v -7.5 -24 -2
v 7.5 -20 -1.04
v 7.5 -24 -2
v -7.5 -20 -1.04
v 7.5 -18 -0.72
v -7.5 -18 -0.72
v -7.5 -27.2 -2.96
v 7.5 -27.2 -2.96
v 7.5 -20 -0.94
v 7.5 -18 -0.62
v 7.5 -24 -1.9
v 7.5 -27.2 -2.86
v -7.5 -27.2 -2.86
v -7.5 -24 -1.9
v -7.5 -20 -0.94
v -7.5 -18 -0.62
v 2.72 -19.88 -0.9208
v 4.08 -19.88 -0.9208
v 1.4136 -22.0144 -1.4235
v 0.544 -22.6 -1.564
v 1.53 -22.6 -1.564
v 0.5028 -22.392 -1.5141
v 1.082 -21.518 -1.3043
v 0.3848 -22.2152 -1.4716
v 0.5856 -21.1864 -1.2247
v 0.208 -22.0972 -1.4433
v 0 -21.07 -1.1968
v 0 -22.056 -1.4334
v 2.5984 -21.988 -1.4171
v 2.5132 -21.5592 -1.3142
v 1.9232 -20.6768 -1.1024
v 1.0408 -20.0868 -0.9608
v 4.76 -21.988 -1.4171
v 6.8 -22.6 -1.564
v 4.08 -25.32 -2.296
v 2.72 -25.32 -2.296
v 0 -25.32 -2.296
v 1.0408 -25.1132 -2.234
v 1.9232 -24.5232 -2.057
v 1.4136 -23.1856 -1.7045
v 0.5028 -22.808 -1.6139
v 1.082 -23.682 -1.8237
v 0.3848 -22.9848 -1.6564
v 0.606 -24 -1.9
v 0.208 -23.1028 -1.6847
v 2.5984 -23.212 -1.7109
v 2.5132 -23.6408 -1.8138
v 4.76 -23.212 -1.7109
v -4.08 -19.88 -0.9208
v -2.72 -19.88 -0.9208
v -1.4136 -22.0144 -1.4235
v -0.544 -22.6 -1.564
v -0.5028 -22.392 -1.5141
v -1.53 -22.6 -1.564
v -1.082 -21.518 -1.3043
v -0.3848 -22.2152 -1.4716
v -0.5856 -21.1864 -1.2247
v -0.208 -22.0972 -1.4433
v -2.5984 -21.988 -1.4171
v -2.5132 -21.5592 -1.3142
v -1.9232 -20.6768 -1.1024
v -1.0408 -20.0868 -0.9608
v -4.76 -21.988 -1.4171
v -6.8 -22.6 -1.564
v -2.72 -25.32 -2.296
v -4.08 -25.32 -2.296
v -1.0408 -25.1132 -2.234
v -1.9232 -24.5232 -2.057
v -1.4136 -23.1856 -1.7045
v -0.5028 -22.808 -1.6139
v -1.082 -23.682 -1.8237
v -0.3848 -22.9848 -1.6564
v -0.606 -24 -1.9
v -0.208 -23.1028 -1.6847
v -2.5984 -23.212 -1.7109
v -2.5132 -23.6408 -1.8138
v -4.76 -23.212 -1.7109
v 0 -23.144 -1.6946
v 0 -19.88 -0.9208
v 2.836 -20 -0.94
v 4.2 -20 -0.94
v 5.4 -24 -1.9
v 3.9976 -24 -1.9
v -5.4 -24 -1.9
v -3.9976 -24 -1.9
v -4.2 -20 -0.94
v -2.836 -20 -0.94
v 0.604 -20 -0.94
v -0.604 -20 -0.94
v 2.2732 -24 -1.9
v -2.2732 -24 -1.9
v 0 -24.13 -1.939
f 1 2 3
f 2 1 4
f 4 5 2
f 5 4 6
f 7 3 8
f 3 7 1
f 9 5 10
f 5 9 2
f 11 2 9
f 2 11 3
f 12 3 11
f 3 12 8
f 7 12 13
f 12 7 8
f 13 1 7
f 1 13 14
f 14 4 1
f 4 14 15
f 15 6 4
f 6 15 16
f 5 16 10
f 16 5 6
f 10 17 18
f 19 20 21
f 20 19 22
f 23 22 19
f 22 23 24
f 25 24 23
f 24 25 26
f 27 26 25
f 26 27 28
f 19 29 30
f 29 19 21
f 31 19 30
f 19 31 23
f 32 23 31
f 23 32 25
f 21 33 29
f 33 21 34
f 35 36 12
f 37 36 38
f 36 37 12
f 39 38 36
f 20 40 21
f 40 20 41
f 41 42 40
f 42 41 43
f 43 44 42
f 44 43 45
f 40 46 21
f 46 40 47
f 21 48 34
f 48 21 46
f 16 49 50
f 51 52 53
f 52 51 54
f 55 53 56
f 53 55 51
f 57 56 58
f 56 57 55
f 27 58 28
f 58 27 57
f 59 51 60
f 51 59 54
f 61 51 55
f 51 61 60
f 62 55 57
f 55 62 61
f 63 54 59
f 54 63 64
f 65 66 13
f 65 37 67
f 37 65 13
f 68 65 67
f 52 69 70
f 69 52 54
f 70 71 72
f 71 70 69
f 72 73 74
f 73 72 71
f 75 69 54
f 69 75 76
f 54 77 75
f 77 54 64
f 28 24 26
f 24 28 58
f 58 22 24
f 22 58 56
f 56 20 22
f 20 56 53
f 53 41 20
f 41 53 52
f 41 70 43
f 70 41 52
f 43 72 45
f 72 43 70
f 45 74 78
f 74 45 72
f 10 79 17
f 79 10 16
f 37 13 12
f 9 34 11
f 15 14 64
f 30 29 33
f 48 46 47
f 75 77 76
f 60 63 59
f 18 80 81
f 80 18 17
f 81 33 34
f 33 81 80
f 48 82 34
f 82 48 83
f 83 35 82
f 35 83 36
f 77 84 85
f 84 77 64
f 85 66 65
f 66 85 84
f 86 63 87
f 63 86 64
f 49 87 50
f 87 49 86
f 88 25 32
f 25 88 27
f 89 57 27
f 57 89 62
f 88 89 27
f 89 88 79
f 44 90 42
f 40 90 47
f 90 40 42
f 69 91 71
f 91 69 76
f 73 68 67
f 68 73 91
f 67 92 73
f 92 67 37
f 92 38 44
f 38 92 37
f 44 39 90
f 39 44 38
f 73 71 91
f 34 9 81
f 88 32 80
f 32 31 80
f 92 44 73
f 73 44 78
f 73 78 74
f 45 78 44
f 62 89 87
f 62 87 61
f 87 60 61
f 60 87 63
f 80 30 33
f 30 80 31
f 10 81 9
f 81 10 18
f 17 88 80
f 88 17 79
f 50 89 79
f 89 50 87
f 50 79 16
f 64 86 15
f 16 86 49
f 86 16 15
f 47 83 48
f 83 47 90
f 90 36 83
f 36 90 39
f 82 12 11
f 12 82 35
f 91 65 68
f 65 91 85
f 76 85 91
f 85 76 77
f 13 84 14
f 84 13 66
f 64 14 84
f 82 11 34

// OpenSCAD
use <../lib.scad>
function ldraw_lib__4198678dc01() = [
// 0 Sticker  1.2 x  1.9 with Silver Train Logo (Formed)
// 0 Name: 4198678dc01.dat
// 0 Author: Tim Lampmann [L4mpi]
// 0 !LDRAW_ORG Part UPDATE 2019-03
// 0 !LICENSE Licensed under CC BY 2.0 and CC BY 4.0 : see CAreadme.txt
// 
// 0 !HELP Origin = Origin Part 45677
// 
// 0 BFC CERTIFY CCW
  [0,"BFC","CERTIFY"],
  [0,"BFC","CCW"],
// 
// 0 !KEYWORDS Cargo, container, Crane, Freight yard, Lorry, Set 4514
// 
// 0 !HISTORY 2019-12-27 [PTadmin] Official Update 2019-03
// 
// 
// 4 16 -18.75 2.6 -50 18.75 2.6 -50 18.75 5 -60 -18.75 5 -60
  [4,16,-18.75,2.6,-50,18.75,2.6,-50,18.75,5,-60,-18.75,5,-60],
// 4 16 -18.75 1.8 -45 18.75 1.8 -45 18.75 2.6 -50 -18.75 2.6 -50
  [4,16,-18.75,1.8,-45,18.75,1.8,-45,18.75,2.6,-50,-18.75,2.6,-50],
// 4 16 -18.75 5 -60 18.75 5 -60 18.75 7.4 -68 -18.75 7.4 -68
  [4,16,-18.75,5,-60,18.75,5,-60,18.75,7.4,-68,-18.75,7.4,-68],
// 
// 4 16 18.75 1.8 -45 18.75 1.55 -45 18.75 2.35 -50 18.75 2.6 -50
  [4,16,18.75,1.8,-45,18.75,1.55,-45,18.75,2.35,-50,18.75,2.6,-50],
// 4 16 18.75 2.6 -50 18.75 2.35 -50 18.75 4.75 -60 18.75 5 -60
  [4,16,18.75,2.6,-50,18.75,2.35,-50,18.75,4.75,-60,18.75,5,-60],
// 4 16 18.75 7.4 -68 18.75 5 -60 18.75 4.75 -60 18.75 7.15 -68
  [4,16,18.75,7.4,-68,18.75,5,-60,18.75,4.75,-60,18.75,7.15,-68],
// 4 16 -18.75 7.4 -68 18.75 7.4 -68 18.75 7.15 -68 -18.75 7.15 -68
  [4,16,-18.75,7.4,-68,18.75,7.4,-68,18.75,7.15,-68,-18.75,7.15,-68],
// 4 16 -18.75 5 -60 -18.75 7.4 -68 -18.75 7.15 -68 -18.75 4.75 -60
  [4,16,-18.75,5,-60,-18.75,7.4,-68,-18.75,7.15,-68,-18.75,4.75,-60],
// 4 16 -18.75 2.6 -50 -18.75 5 -60 -18.75 4.75 -60 -18.75 2.35 -50
  [4,16,-18.75,2.6,-50,-18.75,5,-60,-18.75,4.75,-60,-18.75,2.35,-50],
// 4 16 -18.75 1.8 -45 -18.75 2.6 -50 -18.75 2.35 -50 -18.75 1.55 -45
  [4,16,-18.75,1.8,-45,-18.75,2.6,-50,-18.75,2.35,-50,-18.75,1.55,-45],
// 4 16 -18.75 1.8 -45 -18.75 1.55 -45 18.75 1.55 -45 18.75 1.8 -45
  [4,16,-18.75,1.8,-45,-18.75,1.55,-45,18.75,1.55,-45,18.75,1.8,-45],
// 
// 3 16 18.75 1.55 -45 6.8 2.302 -49.7 10.2 2.302 -49.7
  [3,16,18.75,1.55,-45,6.8,2.302,-49.7,10.2,2.302,-49.7],
// 4 16 1.36 3.91 -56.5 3.825 3.91 -56.5 3.534 3.55864 -55.036 1.257 3.7852 -55.98
  [4,16,1.36,3.91,-56.5,3.825,3.91,-56.5,3.534,3.55864,-55.036,1.257,3.7852,-55.98],
// 4 16 .962 3.67912 -55.538 1.257 3.7852 -55.98 3.534 3.55864 -55.036 2.705 3.2608 -53.795
  [4,16,.962,3.67912,-55.538,1.257,3.7852,-55.98,3.534,3.55864,-55.036,2.705,3.2608,-53.795],
// 4 16 .962 3.67912 -55.538 2.705 3.2608 -53.795 1.464 3.06184 -52.966 .52 3.60832 -55.243
  [4,16,.962,3.67912,-55.538,2.705,3.2608,-53.795,1.464,3.06184,-52.966,.52,3.60832,-55.243],
// 4 16 .52 3.60832 -55.243 1.464 3.06184 -52.966 0 2.992 -52.675 0 3.5836 -55.14
  [4,16,.52,3.60832,-55.243,1.464,3.06184,-52.966,0,2.992,-52.675,0,3.5836,-55.14],
// 4 80 3.825 3.91 -56.5 6.496 3.5428 -54.97 6.283 3.28552 -53.898 3.534 3.55864 -55.036
  [4,80,3.825,3.91,-56.5,6.496,3.5428,-54.97,6.283,3.28552,-53.898,3.534,3.55864,-55.036],
// 4 80 3.534 3.55864 -55.036 6.283 3.28552 -53.898 4.808 2.75608 -51.692 2.705 3.2608 -53.795
  [4,80,3.534,3.55864,-55.036,6.283,3.28552,-53.898,4.808,2.75608,-51.692,2.705,3.2608,-53.795],
// 4 80 2.705 3.2608 -53.795 4.808 2.75608 -51.692 2.602 2.40208 -50.217 1.464 3.06184 -52.966
  [4,80,2.705,3.2608,-53.795,4.808,2.75608,-51.692,2.602,2.40208,-50.217,1.464,3.06184,-52.966],
// 4 80 17 3.91 -56.5 11.9 3.5428 -54.97 6.496 3.5428 -54.97 3.825 3.91 -56.5
  [4,80,17,3.91,-56.5,11.9,3.5428,-54.97,6.496,3.5428,-54.97,3.825,3.91,-56.5],
// 3 16 10.2 5.74 -63.3 6.8 5.74 -63.3 18.75 7.15 -68
  [3,16,10.2,5.74,-63.3,6.8,5.74,-63.3,18.75,7.15,-68],
// 4 16 18.75 7.15 -68 6.8 5.74 -63.3 2.602 5.5849 -62.783 0 5.74 -63.3
  [4,16,18.75,7.15,-68,6.8,5.74,-63.3,2.602,5.5849,-62.783,0,5.74,-63.3],
// 3 16 4.808 5.1424 -61.308 2.602 5.5849 -62.783 6.8 5.74 -63.3
  [3,16,4.808,5.1424,-61.308,2.602,5.5849,-62.783,6.8,5.74,-63.3],
// 4 16 3.534 4.26136 -57.964 3.825 3.91 -56.5 1.36 3.91 -56.5 1.257 4.0348 -57.02
  [4,16,3.534,4.26136,-57.964,3.825,3.91,-56.5,1.36,3.91,-56.5,1.257,4.0348,-57.02],
// 4 16 3.534 4.26136 -57.964 1.257 4.0348 -57.02 .962 4.14088 -57.462 2.705 4.5592 -59.205
  [4,16,3.534,4.26136,-57.964,1.257,4.0348,-57.02,.962,4.14088,-57.462,2.705,4.5592,-59.205],
// 4 16 1.51489747 4.75 -60 2.705 4.5592 -59.205 .962 4.14088 -57.462 .52 4.21168 -57.757
  [4,16,1.51489747,4.75,-60,2.705,4.5592,-59.205,.962,4.14088,-57.462,.52,4.21168,-57.757],
// 4 80 6.283 4.53448 -59.102 6.496 4.2772 -58.03 3.825 3.91 -56.5 3.534 4.26136 -57.964
  [4,80,6.283,4.53448,-59.102,6.496,4.2772,-58.03,3.825,3.91,-56.5,3.534,4.26136,-57.964],
// 4 80 6.496 4.2772 -58.03 11.9 4.2772 -58.03 17 3.91 -56.5 3.825 3.91 -56.5
  [4,80,6.496,4.2772,-58.03,11.9,4.2772,-58.03,17,3.91,-56.5,3.825,3.91,-56.5],
// 3 16 -18.75 1.55 -45 -10.2 2.302 -49.7 -6.8 2.302 -49.7
  [3,16,-18.75,1.55,-45,-10.2,2.302,-49.7,-6.8,2.302,-49.7],
// 4 16 -3.534 3.55864 -55.036 -3.825 3.91 -56.5 -1.36 3.91 -56.5 -1.257 3.7852 -55.98
  [4,16,-3.534,3.55864,-55.036,-3.825,3.91,-56.5,-1.36,3.91,-56.5,-1.257,3.7852,-55.98],
// 4 16 -3.534 3.55864 -55.036 -1.257 3.7852 -55.98 -.962 3.67912 -55.538 -2.705 3.2608 -53.795
  [4,16,-3.534,3.55864,-55.036,-1.257,3.7852,-55.98,-.962,3.67912,-55.538,-2.705,3.2608,-53.795],
// 4 16 -1.464 3.06184 -52.966 -2.705 3.2608 -53.795 -.962 3.67912 -55.538 -.52 3.60832 -55.243
  [4,16,-1.464,3.06184,-52.966,-2.705,3.2608,-53.795,-.962,3.67912,-55.538,-.52,3.60832,-55.243],
// 4 16 0 2.992 -52.675 -1.464 3.06184 -52.966 -.52 3.60832 -55.243 0 3.5836 -55.14
  [4,16,0,2.992,-52.675,-1.464,3.06184,-52.966,-.52,3.60832,-55.243,0,3.5836,-55.14],
// 4 80 -6.283 3.28552 -53.898 -6.496 3.5428 -54.97 -3.825 3.91 -56.5 -3.534 3.55864 -55.036
  [4,80,-6.283,3.28552,-53.898,-6.496,3.5428,-54.97,-3.825,3.91,-56.5,-3.534,3.55864,-55.036],
// 4 80 -4.808 2.75608 -51.692 -6.283 3.28552 -53.898 -3.534 3.55864 -55.036 -2.705 3.2608 -53.795
  [4,80,-4.808,2.75608,-51.692,-6.283,3.28552,-53.898,-3.534,3.55864,-55.036,-2.705,3.2608,-53.795],
// 4 80 -2.602 2.40208 -50.217 -4.808 2.75608 -51.692 -2.705 3.2608 -53.795 -1.464 3.06184 -52.966
  [4,80,-2.602,2.40208,-50.217,-4.808,2.75608,-51.692,-2.705,3.2608,-53.795,-1.464,3.06184,-52.966],
// 4 80 -6.496 3.5428 -54.97 -11.9 3.5428 -54.97 -17 3.91 -56.5 -3.825 3.91 -56.5
  [4,80,-6.496,3.5428,-54.97,-11.9,3.5428,-54.97,-17,3.91,-56.5,-3.825,3.91,-56.5],
// 3 16 -6.8 5.74 -63.3 -10.2 5.74 -63.3 -18.75 7.15 -68
  [3,16,-6.8,5.74,-63.3,-10.2,5.74,-63.3,-18.75,7.15,-68],
// 4 16 -2.602 5.5849 -62.783 -6.8 5.74 -63.3 -18.75 7.15 -68 0 5.74 -63.3
  [4,16,-2.602,5.5849,-62.783,-6.8,5.74,-63.3,-18.75,7.15,-68,0,5.74,-63.3],
// 3 16 -4.808 5.1424 -61.308 -6.8 5.74 -63.3 -2.602 5.5849 -62.783
  [3,16,-4.808,5.1424,-61.308,-6.8,5.74,-63.3,-2.602,5.5849,-62.783],
// 4 16 -1.36 3.91 -56.5 -3.825 3.91 -56.5 -3.534 4.26136 -57.964 -1.257 4.0348 -57.02
  [4,16,-1.36,3.91,-56.5,-3.825,3.91,-56.5,-3.534,4.26136,-57.964,-1.257,4.0348,-57.02],
// 4 16 -.962 4.14088 -57.462 -1.257 4.0348 -57.02 -3.534 4.26136 -57.964 -2.705 4.5592 -59.205
  [4,16,-.962,4.14088,-57.462,-1.257,4.0348,-57.02,-3.534,4.26136,-57.964,-2.705,4.5592,-59.205],
// 4 16 -.962 4.14088 -57.462 -2.705 4.5592 -59.205 -1.51489747 4.75 -60 -.52 4.21168 -57.757
  [4,16,-.962,4.14088,-57.462,-2.705,4.5592,-59.205,-1.51489747,4.75,-60,-.52,4.21168,-57.757],
// 4 80 -3.825 3.91 -56.5 -6.496 4.2772 -58.03 -6.283 4.53448 -59.102 -3.534 4.26136 -57.964
  [4,80,-3.825,3.91,-56.5,-6.496,4.2772,-58.03,-6.283,4.53448,-59.102,-3.534,4.26136,-57.964],
// 4 80 -17 3.91 -56.5 -11.9 4.2772 -58.03 -6.496 4.2772 -58.03 -3.825 3.91 -56.5
  [4,80,-17,3.91,-56.5,-11.9,4.2772,-58.03,-6.496,4.2772,-58.03,-3.825,3.91,-56.5],
// 4 80 .52 3.60832 -55.243 0 3.5836 -55.14 -.52 3.60832 -55.243 .962 3.67912 -55.538
  [4,80,.52,3.60832,-55.243,0,3.5836,-55.14,-.52,3.60832,-55.243,.962,3.67912,-55.538],
// 4 80 .962 3.67912 -55.538 -.52 3.60832 -55.243 -.962 3.67912 -55.538 1.257 3.7852 -55.98
  [4,80,.962,3.67912,-55.538,-.52,3.60832,-55.243,-.962,3.67912,-55.538,1.257,3.7852,-55.98],
// 4 80 1.257 3.7852 -55.98 -.962 3.67912 -55.538 -1.257 3.7852 -55.98 1.36 3.91 -56.5
  [4,80,1.257,3.7852,-55.98,-.962,3.67912,-55.538,-1.257,3.7852,-55.98,1.36,3.91,-56.5],
// 4 80 1.36 3.91 -56.5 -1.257 3.7852 -55.98 -1.36 3.91 -56.5 1.257 4.0348 -57.02
  [4,80,1.36,3.91,-56.5,-1.257,3.7852,-55.98,-1.36,3.91,-56.5,1.257,4.0348,-57.02],
// 4 80 1.257 4.0348 -57.02 -1.36 3.91 -56.5 -1.257 4.0348 -57.02 .962 4.14088 -57.462
  [4,80,1.257,4.0348,-57.02,-1.36,3.91,-56.5,-1.257,4.0348,-57.02,.962,4.14088,-57.462],
// 4 80 .962 4.14088 -57.462 -1.257 4.0348 -57.02 -.962 4.14088 -57.462 .52 4.21168 -57.757
  [4,80,.962,4.14088,-57.462,-1.257,4.0348,-57.02,-.962,4.14088,-57.462,.52,4.21168,-57.757],
// 4 80 .52 4.21168 -57.757 -.962 4.14088 -57.462 -.52 4.21168 -57.757 0 4.2364 -57.86
  [4,80,.52,4.21168,-57.757,-.962,4.14088,-57.462,-.52,4.21168,-57.757,0,4.2364,-57.86],
// 4 16 18.75 1.55 -45 -18.75 1.55 -45 0 2.302 -49.7 6.8 2.302 -49.7
  [4,16,18.75,1.55,-45,-18.75,1.55,-45,0,2.302,-49.7,6.8,2.302,-49.7],
// 3 16 0 5.74 -63.3 -18.75 7.15 -68 18.75 7.15 -68
  [3,16,0,5.74,-63.3,-18.75,7.15,-68,18.75,7.15,-68],
// 3 16 18.75 2.35 -50 17 3.91 -56.5 18.75 4.75 -60
  [3,16,18.75,2.35,-50,17,3.91,-56.5,18.75,4.75,-60],
// 3 16 -18.75 2.35 -50 -18.75 4.75 -60 -17 3.91 -56.5
  [3,16,-18.75,2.35,-50,-18.75,4.75,-60,-17,3.91,-56.5],
// 3 16 6.283 3.28552 -53.898 6.496 3.5428 -54.97 11.9 3.5428 -54.97
  [3,16,6.283,3.28552,-53.898,6.496,3.5428,-54.97,11.9,3.5428,-54.97],
// 3 16 11.9 4.2772 -58.03 6.496 4.2772 -58.03 6.283 4.53448 -59.102
  [3,16,11.9,4.2772,-58.03,6.496,4.2772,-58.03,6.283,4.53448,-59.102],
// 3 16 -6.496 4.2772 -58.03 -11.9 4.2772 -58.03 -6.283 4.53448 -59.102
  [3,16,-6.496,4.2772,-58.03,-11.9,4.2772,-58.03,-6.283,4.53448,-59.102],
// 3 16 -6.283 3.28552 -53.898 -11.9 3.5428 -54.97 -6.496 3.5428 -54.97
  [3,16,-6.283,3.28552,-53.898,-11.9,3.5428,-54.97,-6.496,3.5428,-54.97],
// 4 80 10.2 2.302 -49.7 6.8 2.302 -49.7 7.09 2.35 -50 10.5 2.35 -50
  [4,80,10.2,2.302,-49.7,6.8,2.302,-49.7,7.09,2.35,-50,10.5,2.35,-50],
// 4 80 17 3.91 -56.5 10.5 2.35 -50 7.09 2.35 -50 11.9 3.5428 -54.97
  [4,80,17,3.91,-56.5,10.5,2.35,-50,7.09,2.35,-50,11.9,3.5428,-54.97],
// 4 80 9.994 4.75 -60 13.5 4.75 -60 17 3.91 -56.5 11.9 4.2772 -58.03
  [4,80,9.994,4.75,-60,13.5,4.75,-60,17,3.91,-56.5,11.9,4.2772,-58.03],
// 4 80 6.8 5.74 -63.3 10.2 5.74 -63.3 13.5 4.75 -60 9.994 4.75 -60
  [4,80,6.8,5.74,-63.3,10.2,5.74,-63.3,13.5,4.75,-60,9.994,4.75,-60],
// 4 80 -17 3.91 -56.5 -13.5 4.75 -60 -9.994 4.75 -60 -11.9 4.2772 -58.03
  [4,80,-17,3.91,-56.5,-13.5,4.75,-60,-9.994,4.75,-60,-11.9,4.2772,-58.03],
// 4 80 -6.8 5.74 -63.3 -9.994 4.75 -60 -13.5 4.75 -60 -10.2 5.74 -63.3
  [4,80,-6.8,5.74,-63.3,-9.994,4.75,-60,-13.5,4.75,-60,-10.2,5.74,-63.3],
// 4 80 -17 3.91 -56.5 -11.9 3.5428 -54.97 -7.09 2.35 -50 -10.5 2.35 -50
  [4,80,-17,3.91,-56.5,-11.9,3.5428,-54.97,-7.09,2.35,-50,-10.5,2.35,-50],
// 4 80 -10.2 2.302 -49.7 -10.5 2.35 -50 -7.09 2.35 -50 -6.8 2.302 -49.7
  [4,80,-10.2,2.302,-49.7,-10.5,2.35,-50,-7.09,2.35,-50,-6.8,2.302,-49.7],
// 4 80 1.464 3.06184 -52.966 2.602 2.40208 -50.217 1.51 2.35 -50 0 2.992 -52.675
  [4,80,1.464,3.06184,-52.966,2.602,2.40208,-50.217,1.51,2.35,-50,0,2.992,-52.675],
// 4 80 -2.602 2.40208 -50.217 -1.464 3.06184 -52.966 0 2.992 -52.675 -1.51 2.35 -50
  [4,80,-2.602,2.40208,-50.217,-1.464,3.06184,-52.966,0,2.992,-52.675,-1.51,2.35,-50],
// 3 80 1.51 2.35 -50 -1.51 2.35 -50 0 2.992 -52.675
  [3,80,1.51,2.35,-50,-1.51,2.35,-50,0,2.992,-52.675],
// 3 80 -1.51 2.35 -50 1.51 2.35 -50 0 2.302 -49.7
  [3,80,-1.51,2.35,-50,1.51,2.35,-50,0,2.302,-49.7],
// 3 80 1.515 4.75 -60 5.683 4.75 -60 2.705 4.5592 -59.205
  [3,80,1.515,4.75,-60,5.683,4.75,-60,2.705,4.5592,-59.205],
// 4 80 3.534 4.26136 -57.964 2.705 4.5592 -59.205 5.683 4.75 -60 6.283 4.53448 -59.102
  [4,80,3.534,4.26136,-57.964,2.705,4.5592,-59.205,5.683,4.75,-60,6.283,4.53448,-59.102],
// 4 80 -6.283 4.53448 -59.102 -5.683 4.75 -60 -2.705 4.5592 -59.205 -3.534 4.26136 -57.964
  [4,80,-6.283,4.53448,-59.102,-5.683,4.75,-60,-2.705,4.5592,-59.205,-3.534,4.26136,-57.964],
// 4 80 -1.515 4.75 -60 -5.683 4.75 -60 -4.808 5.1424 -61.308 -2.602 5.5849 -62.783
  [4,80,-1.515,4.75,-60,-5.683,4.75,-60,-4.808,5.1424,-61.308,-2.602,5.5849,-62.783],
// 4 80 -1.515 4.75 -60 -2.602 5.5849 -62.783 0 5.74 -63.3 0 4.8475 -60.325
  [4,80,-1.515,4.75,-60,-2.602,5.5849,-62.783,0,5.74,-63.3,0,4.8475,-60.325],
// 4 80 0 4.8475 -60.325 0 5.74 -63.3 2.602 5.5849 -62.783 1.515 4.75 -60
  [4,80,0,4.8475,-60.325,0,5.74,-63.3,2.602,5.5849,-62.783,1.515,4.75,-60],
// 4 80 1.515 4.75 -60 2.602 5.5849 -62.783 4.808 5.1424 -61.308 5.683 4.75 -60
  [4,80,1.515,4.75,-60,2.602,5.5849,-62.783,4.808,5.1424,-61.308,5.683,4.75,-60],
// 3 80 -1.515 4.75 -60 -2.705 4.5592 -59.205 -5.683 4.75 -60
  [3,80,-1.515,4.75,-60,-2.705,4.5592,-59.205,-5.683,4.75,-60],
// 3 16 17 3.91 -56.5 18.75 2.35 -50 10.5 2.35 -50
  [3,16,17,3.91,-56.5,18.75,2.35,-50,10.5,2.35,-50],
// 3 16 1.51 2.35 -50 2.602 2.40208 -50.217 7.09 2.35 -50
  [3,16,1.51,2.35,-50,2.602,2.40208,-50.217,7.09,2.35,-50],
// 3 16 2.602 2.40208 -50.217 4.808 2.75608 -51.692 7.09 2.35 -50
  [3,16,2.602,2.40208,-50.217,4.808,2.75608,-51.692,7.09,2.35,-50],
// 3 16 0 4.8475 -60.325 1.515 4.75 -60 -1.515 4.75 -60
  [3,16,0,4.8475,-60.325,1.515,4.75,-60,-1.515,4.75,-60],
// 3 16 -1.515 4.75 -60 1.515 4.75 -60 0 4.2364 -57.86
  [3,16,-1.515,4.75,-60,1.515,4.75,-60,0,4.2364,-57.86],
// 3 16 -1.515 4.75 -60 0 4.2364 -57.86 -.52 4.21168 -57.757
  [3,16,-1.515,4.75,-60,0,4.2364,-57.86,-.52,4.21168,-57.757],
// 3 16 .52 4.21168 -57.757 0 4.2364 -57.86 1.515 4.75 -60
  [3,16,.52,4.21168,-57.757,0,4.2364,-57.86,1.515,4.75,-60],
// 3 16 -2.602 2.40208 -50.217 -1.51 2.35 -50 -7.09 2.35 -50
  [3,16,-2.602,2.40208,-50.217,-1.51,2.35,-50,-7.09,2.35,-50],
// 3 16 -2.602 2.40208 -50.217 -7.09 2.35 -50 -4.808 2.75608 -51.692
  [3,16,-2.602,2.40208,-50.217,-7.09,2.35,-50,-4.808,2.75608,-51.692],
// 4 16 -11.9 3.5428 -54.97 -6.283 3.28552 -53.898 -4.808 2.75608 -51.692 -7.09 2.35 -50
  [4,16,-11.9,3.5428,-54.97,-6.283,3.28552,-53.898,-4.808,2.75608,-51.692,-7.09,2.35,-50],
// 4 16 4.808 2.75608 -51.692 6.283 3.28552 -53.898 11.9 3.5428 -54.97 7.09 2.35 -50
  [4,16,4.808,2.75608,-51.692,6.283,3.28552,-53.898,11.9,3.5428,-54.97,7.09,2.35,-50],
// 4 16 10.5 2.35 -50 18.75 2.35 -50 18.75 1.55 -45 10.2 2.302 -49.7
  [4,16,10.5,2.35,-50,18.75,2.35,-50,18.75,1.55,-45,10.2,2.302,-49.7],
// 4 16 1.51 2.35 -50 7.09 2.35 -50 6.8 2.302 -49.7 0 2.302 -49.7
  [4,16,1.51,2.35,-50,7.09,2.35,-50,6.8,2.302,-49.7,0,2.302,-49.7],
// 4 16 -7.09 2.35 -50 -1.51 2.35 -50 0 2.302 -49.7 -6.8 2.302 -49.7
  [4,16,-7.09,2.35,-50,-1.51,2.35,-50,0,2.302,-49.7,-6.8,2.302,-49.7],
// 3 16 -6.8 2.302 -49.7 0 2.302 -49.7 -18.75 1.55 -45
  [3,16,-6.8,2.302,-49.7,0,2.302,-49.7,-18.75,1.55,-45],
// 3 16 -17 3.91 -56.5 -10.5 2.35 -50 -18.75 2.35 -50
  [3,16,-17,3.91,-56.5,-10.5,2.35,-50,-18.75,2.35,-50],
// 4 16 -18.75 1.55 -45 -18.75 2.35 -50 -10.5 2.35 -50 -10.2 2.302 -49.7
  [4,16,-18.75,1.55,-45,-18.75,2.35,-50,-10.5,2.35,-50,-10.2,2.302,-49.7],
// 4 16 5.683 4.75 -60 9.994 4.75 -60 11.9 4.2772 -58.03 6.283 4.53448 -59.102
  [4,16,5.683,4.75,-60,9.994,4.75,-60,11.9,4.2772,-58.03,6.283,4.53448,-59.102],
// 4 16 5.683 4.75 -60 4.808 5.1424 -61.308 6.8 5.74 -63.3 9.994 4.75 -60
  [4,16,5.683,4.75,-60,4.808,5.1424,-61.308,6.8,5.74,-63.3,9.994,4.75,-60],
// 4 16 10.2 5.74 -63.3 18.75 7.15 -68 18.75 4.75 -60 13.5 4.75 -60
  [4,16,10.2,5.74,-63.3,18.75,7.15,-68,18.75,4.75,-60,13.5,4.75,-60],
// 4 16 -6.8 5.74 -63.3 -4.808 5.1424 -61.308 -5.683 4.75 -60 -9.994 4.75 -60
  [4,16,-6.8,5.74,-63.3,-4.808,5.1424,-61.308,-5.683,4.75,-60,-9.994,4.75,-60],
// 4 16 -9.994 4.75 -60 -5.683 4.75 -60 -6.283 4.53448 -59.102 -11.9 4.2772 -58.03
  [4,16,-9.994,4.75,-60,-5.683,4.75,-60,-6.283,4.53448,-59.102,-11.9,4.2772,-58.03],
// 4 16 -18.75 4.75 -60 -18.75 7.15 -68 -10.2 5.74 -63.3 -13.5 4.75 -60
  [4,16,-18.75,4.75,-60,-18.75,7.15,-68,-10.2,5.74,-63.3,-13.5,4.75,-60],
// 3 16 -17 3.91 -56.5 -18.75 4.75 -60 -13.5 4.75 -60
  [3,16,-17,3.91,-56.5,-18.75,4.75,-60,-13.5,4.75,-60],
// 3 16 13.5 4.75 -60 18.75 4.75 -60 17 3.91 -56.5
  [3,16,13.5,4.75,-60,18.75,4.75,-60,17,3.91,-56.5],
// 
// 5 24 18.75 2.35 -50 -18.75 2.35 -50 0 1.55 -45 0 4.75 -60
  [5,24,18.75,2.35,-50,-18.75,2.35,-50,0,1.55,-45,0,4.75,-60],
// 5 24 18.75 4.75 -60 -18.75 4.75 -60 0 2.35 -50 0 7.15 -68
  [5,24,18.75,4.75,-60,-18.75,4.75,-60,0,2.35,-50,0,7.15,-68],
];
module ldraw_lib__4198678dc01(step=0, col=false, unit=2/5, alt=false, line=0.2, solid=!$preview)
    makepoly(ldraw_lib__4198678dc01(), step=step, col=col, unit=unit, alt=alt, line=line, solid=solid);
ldraw_lib__4198678dc01(line=0.2);
